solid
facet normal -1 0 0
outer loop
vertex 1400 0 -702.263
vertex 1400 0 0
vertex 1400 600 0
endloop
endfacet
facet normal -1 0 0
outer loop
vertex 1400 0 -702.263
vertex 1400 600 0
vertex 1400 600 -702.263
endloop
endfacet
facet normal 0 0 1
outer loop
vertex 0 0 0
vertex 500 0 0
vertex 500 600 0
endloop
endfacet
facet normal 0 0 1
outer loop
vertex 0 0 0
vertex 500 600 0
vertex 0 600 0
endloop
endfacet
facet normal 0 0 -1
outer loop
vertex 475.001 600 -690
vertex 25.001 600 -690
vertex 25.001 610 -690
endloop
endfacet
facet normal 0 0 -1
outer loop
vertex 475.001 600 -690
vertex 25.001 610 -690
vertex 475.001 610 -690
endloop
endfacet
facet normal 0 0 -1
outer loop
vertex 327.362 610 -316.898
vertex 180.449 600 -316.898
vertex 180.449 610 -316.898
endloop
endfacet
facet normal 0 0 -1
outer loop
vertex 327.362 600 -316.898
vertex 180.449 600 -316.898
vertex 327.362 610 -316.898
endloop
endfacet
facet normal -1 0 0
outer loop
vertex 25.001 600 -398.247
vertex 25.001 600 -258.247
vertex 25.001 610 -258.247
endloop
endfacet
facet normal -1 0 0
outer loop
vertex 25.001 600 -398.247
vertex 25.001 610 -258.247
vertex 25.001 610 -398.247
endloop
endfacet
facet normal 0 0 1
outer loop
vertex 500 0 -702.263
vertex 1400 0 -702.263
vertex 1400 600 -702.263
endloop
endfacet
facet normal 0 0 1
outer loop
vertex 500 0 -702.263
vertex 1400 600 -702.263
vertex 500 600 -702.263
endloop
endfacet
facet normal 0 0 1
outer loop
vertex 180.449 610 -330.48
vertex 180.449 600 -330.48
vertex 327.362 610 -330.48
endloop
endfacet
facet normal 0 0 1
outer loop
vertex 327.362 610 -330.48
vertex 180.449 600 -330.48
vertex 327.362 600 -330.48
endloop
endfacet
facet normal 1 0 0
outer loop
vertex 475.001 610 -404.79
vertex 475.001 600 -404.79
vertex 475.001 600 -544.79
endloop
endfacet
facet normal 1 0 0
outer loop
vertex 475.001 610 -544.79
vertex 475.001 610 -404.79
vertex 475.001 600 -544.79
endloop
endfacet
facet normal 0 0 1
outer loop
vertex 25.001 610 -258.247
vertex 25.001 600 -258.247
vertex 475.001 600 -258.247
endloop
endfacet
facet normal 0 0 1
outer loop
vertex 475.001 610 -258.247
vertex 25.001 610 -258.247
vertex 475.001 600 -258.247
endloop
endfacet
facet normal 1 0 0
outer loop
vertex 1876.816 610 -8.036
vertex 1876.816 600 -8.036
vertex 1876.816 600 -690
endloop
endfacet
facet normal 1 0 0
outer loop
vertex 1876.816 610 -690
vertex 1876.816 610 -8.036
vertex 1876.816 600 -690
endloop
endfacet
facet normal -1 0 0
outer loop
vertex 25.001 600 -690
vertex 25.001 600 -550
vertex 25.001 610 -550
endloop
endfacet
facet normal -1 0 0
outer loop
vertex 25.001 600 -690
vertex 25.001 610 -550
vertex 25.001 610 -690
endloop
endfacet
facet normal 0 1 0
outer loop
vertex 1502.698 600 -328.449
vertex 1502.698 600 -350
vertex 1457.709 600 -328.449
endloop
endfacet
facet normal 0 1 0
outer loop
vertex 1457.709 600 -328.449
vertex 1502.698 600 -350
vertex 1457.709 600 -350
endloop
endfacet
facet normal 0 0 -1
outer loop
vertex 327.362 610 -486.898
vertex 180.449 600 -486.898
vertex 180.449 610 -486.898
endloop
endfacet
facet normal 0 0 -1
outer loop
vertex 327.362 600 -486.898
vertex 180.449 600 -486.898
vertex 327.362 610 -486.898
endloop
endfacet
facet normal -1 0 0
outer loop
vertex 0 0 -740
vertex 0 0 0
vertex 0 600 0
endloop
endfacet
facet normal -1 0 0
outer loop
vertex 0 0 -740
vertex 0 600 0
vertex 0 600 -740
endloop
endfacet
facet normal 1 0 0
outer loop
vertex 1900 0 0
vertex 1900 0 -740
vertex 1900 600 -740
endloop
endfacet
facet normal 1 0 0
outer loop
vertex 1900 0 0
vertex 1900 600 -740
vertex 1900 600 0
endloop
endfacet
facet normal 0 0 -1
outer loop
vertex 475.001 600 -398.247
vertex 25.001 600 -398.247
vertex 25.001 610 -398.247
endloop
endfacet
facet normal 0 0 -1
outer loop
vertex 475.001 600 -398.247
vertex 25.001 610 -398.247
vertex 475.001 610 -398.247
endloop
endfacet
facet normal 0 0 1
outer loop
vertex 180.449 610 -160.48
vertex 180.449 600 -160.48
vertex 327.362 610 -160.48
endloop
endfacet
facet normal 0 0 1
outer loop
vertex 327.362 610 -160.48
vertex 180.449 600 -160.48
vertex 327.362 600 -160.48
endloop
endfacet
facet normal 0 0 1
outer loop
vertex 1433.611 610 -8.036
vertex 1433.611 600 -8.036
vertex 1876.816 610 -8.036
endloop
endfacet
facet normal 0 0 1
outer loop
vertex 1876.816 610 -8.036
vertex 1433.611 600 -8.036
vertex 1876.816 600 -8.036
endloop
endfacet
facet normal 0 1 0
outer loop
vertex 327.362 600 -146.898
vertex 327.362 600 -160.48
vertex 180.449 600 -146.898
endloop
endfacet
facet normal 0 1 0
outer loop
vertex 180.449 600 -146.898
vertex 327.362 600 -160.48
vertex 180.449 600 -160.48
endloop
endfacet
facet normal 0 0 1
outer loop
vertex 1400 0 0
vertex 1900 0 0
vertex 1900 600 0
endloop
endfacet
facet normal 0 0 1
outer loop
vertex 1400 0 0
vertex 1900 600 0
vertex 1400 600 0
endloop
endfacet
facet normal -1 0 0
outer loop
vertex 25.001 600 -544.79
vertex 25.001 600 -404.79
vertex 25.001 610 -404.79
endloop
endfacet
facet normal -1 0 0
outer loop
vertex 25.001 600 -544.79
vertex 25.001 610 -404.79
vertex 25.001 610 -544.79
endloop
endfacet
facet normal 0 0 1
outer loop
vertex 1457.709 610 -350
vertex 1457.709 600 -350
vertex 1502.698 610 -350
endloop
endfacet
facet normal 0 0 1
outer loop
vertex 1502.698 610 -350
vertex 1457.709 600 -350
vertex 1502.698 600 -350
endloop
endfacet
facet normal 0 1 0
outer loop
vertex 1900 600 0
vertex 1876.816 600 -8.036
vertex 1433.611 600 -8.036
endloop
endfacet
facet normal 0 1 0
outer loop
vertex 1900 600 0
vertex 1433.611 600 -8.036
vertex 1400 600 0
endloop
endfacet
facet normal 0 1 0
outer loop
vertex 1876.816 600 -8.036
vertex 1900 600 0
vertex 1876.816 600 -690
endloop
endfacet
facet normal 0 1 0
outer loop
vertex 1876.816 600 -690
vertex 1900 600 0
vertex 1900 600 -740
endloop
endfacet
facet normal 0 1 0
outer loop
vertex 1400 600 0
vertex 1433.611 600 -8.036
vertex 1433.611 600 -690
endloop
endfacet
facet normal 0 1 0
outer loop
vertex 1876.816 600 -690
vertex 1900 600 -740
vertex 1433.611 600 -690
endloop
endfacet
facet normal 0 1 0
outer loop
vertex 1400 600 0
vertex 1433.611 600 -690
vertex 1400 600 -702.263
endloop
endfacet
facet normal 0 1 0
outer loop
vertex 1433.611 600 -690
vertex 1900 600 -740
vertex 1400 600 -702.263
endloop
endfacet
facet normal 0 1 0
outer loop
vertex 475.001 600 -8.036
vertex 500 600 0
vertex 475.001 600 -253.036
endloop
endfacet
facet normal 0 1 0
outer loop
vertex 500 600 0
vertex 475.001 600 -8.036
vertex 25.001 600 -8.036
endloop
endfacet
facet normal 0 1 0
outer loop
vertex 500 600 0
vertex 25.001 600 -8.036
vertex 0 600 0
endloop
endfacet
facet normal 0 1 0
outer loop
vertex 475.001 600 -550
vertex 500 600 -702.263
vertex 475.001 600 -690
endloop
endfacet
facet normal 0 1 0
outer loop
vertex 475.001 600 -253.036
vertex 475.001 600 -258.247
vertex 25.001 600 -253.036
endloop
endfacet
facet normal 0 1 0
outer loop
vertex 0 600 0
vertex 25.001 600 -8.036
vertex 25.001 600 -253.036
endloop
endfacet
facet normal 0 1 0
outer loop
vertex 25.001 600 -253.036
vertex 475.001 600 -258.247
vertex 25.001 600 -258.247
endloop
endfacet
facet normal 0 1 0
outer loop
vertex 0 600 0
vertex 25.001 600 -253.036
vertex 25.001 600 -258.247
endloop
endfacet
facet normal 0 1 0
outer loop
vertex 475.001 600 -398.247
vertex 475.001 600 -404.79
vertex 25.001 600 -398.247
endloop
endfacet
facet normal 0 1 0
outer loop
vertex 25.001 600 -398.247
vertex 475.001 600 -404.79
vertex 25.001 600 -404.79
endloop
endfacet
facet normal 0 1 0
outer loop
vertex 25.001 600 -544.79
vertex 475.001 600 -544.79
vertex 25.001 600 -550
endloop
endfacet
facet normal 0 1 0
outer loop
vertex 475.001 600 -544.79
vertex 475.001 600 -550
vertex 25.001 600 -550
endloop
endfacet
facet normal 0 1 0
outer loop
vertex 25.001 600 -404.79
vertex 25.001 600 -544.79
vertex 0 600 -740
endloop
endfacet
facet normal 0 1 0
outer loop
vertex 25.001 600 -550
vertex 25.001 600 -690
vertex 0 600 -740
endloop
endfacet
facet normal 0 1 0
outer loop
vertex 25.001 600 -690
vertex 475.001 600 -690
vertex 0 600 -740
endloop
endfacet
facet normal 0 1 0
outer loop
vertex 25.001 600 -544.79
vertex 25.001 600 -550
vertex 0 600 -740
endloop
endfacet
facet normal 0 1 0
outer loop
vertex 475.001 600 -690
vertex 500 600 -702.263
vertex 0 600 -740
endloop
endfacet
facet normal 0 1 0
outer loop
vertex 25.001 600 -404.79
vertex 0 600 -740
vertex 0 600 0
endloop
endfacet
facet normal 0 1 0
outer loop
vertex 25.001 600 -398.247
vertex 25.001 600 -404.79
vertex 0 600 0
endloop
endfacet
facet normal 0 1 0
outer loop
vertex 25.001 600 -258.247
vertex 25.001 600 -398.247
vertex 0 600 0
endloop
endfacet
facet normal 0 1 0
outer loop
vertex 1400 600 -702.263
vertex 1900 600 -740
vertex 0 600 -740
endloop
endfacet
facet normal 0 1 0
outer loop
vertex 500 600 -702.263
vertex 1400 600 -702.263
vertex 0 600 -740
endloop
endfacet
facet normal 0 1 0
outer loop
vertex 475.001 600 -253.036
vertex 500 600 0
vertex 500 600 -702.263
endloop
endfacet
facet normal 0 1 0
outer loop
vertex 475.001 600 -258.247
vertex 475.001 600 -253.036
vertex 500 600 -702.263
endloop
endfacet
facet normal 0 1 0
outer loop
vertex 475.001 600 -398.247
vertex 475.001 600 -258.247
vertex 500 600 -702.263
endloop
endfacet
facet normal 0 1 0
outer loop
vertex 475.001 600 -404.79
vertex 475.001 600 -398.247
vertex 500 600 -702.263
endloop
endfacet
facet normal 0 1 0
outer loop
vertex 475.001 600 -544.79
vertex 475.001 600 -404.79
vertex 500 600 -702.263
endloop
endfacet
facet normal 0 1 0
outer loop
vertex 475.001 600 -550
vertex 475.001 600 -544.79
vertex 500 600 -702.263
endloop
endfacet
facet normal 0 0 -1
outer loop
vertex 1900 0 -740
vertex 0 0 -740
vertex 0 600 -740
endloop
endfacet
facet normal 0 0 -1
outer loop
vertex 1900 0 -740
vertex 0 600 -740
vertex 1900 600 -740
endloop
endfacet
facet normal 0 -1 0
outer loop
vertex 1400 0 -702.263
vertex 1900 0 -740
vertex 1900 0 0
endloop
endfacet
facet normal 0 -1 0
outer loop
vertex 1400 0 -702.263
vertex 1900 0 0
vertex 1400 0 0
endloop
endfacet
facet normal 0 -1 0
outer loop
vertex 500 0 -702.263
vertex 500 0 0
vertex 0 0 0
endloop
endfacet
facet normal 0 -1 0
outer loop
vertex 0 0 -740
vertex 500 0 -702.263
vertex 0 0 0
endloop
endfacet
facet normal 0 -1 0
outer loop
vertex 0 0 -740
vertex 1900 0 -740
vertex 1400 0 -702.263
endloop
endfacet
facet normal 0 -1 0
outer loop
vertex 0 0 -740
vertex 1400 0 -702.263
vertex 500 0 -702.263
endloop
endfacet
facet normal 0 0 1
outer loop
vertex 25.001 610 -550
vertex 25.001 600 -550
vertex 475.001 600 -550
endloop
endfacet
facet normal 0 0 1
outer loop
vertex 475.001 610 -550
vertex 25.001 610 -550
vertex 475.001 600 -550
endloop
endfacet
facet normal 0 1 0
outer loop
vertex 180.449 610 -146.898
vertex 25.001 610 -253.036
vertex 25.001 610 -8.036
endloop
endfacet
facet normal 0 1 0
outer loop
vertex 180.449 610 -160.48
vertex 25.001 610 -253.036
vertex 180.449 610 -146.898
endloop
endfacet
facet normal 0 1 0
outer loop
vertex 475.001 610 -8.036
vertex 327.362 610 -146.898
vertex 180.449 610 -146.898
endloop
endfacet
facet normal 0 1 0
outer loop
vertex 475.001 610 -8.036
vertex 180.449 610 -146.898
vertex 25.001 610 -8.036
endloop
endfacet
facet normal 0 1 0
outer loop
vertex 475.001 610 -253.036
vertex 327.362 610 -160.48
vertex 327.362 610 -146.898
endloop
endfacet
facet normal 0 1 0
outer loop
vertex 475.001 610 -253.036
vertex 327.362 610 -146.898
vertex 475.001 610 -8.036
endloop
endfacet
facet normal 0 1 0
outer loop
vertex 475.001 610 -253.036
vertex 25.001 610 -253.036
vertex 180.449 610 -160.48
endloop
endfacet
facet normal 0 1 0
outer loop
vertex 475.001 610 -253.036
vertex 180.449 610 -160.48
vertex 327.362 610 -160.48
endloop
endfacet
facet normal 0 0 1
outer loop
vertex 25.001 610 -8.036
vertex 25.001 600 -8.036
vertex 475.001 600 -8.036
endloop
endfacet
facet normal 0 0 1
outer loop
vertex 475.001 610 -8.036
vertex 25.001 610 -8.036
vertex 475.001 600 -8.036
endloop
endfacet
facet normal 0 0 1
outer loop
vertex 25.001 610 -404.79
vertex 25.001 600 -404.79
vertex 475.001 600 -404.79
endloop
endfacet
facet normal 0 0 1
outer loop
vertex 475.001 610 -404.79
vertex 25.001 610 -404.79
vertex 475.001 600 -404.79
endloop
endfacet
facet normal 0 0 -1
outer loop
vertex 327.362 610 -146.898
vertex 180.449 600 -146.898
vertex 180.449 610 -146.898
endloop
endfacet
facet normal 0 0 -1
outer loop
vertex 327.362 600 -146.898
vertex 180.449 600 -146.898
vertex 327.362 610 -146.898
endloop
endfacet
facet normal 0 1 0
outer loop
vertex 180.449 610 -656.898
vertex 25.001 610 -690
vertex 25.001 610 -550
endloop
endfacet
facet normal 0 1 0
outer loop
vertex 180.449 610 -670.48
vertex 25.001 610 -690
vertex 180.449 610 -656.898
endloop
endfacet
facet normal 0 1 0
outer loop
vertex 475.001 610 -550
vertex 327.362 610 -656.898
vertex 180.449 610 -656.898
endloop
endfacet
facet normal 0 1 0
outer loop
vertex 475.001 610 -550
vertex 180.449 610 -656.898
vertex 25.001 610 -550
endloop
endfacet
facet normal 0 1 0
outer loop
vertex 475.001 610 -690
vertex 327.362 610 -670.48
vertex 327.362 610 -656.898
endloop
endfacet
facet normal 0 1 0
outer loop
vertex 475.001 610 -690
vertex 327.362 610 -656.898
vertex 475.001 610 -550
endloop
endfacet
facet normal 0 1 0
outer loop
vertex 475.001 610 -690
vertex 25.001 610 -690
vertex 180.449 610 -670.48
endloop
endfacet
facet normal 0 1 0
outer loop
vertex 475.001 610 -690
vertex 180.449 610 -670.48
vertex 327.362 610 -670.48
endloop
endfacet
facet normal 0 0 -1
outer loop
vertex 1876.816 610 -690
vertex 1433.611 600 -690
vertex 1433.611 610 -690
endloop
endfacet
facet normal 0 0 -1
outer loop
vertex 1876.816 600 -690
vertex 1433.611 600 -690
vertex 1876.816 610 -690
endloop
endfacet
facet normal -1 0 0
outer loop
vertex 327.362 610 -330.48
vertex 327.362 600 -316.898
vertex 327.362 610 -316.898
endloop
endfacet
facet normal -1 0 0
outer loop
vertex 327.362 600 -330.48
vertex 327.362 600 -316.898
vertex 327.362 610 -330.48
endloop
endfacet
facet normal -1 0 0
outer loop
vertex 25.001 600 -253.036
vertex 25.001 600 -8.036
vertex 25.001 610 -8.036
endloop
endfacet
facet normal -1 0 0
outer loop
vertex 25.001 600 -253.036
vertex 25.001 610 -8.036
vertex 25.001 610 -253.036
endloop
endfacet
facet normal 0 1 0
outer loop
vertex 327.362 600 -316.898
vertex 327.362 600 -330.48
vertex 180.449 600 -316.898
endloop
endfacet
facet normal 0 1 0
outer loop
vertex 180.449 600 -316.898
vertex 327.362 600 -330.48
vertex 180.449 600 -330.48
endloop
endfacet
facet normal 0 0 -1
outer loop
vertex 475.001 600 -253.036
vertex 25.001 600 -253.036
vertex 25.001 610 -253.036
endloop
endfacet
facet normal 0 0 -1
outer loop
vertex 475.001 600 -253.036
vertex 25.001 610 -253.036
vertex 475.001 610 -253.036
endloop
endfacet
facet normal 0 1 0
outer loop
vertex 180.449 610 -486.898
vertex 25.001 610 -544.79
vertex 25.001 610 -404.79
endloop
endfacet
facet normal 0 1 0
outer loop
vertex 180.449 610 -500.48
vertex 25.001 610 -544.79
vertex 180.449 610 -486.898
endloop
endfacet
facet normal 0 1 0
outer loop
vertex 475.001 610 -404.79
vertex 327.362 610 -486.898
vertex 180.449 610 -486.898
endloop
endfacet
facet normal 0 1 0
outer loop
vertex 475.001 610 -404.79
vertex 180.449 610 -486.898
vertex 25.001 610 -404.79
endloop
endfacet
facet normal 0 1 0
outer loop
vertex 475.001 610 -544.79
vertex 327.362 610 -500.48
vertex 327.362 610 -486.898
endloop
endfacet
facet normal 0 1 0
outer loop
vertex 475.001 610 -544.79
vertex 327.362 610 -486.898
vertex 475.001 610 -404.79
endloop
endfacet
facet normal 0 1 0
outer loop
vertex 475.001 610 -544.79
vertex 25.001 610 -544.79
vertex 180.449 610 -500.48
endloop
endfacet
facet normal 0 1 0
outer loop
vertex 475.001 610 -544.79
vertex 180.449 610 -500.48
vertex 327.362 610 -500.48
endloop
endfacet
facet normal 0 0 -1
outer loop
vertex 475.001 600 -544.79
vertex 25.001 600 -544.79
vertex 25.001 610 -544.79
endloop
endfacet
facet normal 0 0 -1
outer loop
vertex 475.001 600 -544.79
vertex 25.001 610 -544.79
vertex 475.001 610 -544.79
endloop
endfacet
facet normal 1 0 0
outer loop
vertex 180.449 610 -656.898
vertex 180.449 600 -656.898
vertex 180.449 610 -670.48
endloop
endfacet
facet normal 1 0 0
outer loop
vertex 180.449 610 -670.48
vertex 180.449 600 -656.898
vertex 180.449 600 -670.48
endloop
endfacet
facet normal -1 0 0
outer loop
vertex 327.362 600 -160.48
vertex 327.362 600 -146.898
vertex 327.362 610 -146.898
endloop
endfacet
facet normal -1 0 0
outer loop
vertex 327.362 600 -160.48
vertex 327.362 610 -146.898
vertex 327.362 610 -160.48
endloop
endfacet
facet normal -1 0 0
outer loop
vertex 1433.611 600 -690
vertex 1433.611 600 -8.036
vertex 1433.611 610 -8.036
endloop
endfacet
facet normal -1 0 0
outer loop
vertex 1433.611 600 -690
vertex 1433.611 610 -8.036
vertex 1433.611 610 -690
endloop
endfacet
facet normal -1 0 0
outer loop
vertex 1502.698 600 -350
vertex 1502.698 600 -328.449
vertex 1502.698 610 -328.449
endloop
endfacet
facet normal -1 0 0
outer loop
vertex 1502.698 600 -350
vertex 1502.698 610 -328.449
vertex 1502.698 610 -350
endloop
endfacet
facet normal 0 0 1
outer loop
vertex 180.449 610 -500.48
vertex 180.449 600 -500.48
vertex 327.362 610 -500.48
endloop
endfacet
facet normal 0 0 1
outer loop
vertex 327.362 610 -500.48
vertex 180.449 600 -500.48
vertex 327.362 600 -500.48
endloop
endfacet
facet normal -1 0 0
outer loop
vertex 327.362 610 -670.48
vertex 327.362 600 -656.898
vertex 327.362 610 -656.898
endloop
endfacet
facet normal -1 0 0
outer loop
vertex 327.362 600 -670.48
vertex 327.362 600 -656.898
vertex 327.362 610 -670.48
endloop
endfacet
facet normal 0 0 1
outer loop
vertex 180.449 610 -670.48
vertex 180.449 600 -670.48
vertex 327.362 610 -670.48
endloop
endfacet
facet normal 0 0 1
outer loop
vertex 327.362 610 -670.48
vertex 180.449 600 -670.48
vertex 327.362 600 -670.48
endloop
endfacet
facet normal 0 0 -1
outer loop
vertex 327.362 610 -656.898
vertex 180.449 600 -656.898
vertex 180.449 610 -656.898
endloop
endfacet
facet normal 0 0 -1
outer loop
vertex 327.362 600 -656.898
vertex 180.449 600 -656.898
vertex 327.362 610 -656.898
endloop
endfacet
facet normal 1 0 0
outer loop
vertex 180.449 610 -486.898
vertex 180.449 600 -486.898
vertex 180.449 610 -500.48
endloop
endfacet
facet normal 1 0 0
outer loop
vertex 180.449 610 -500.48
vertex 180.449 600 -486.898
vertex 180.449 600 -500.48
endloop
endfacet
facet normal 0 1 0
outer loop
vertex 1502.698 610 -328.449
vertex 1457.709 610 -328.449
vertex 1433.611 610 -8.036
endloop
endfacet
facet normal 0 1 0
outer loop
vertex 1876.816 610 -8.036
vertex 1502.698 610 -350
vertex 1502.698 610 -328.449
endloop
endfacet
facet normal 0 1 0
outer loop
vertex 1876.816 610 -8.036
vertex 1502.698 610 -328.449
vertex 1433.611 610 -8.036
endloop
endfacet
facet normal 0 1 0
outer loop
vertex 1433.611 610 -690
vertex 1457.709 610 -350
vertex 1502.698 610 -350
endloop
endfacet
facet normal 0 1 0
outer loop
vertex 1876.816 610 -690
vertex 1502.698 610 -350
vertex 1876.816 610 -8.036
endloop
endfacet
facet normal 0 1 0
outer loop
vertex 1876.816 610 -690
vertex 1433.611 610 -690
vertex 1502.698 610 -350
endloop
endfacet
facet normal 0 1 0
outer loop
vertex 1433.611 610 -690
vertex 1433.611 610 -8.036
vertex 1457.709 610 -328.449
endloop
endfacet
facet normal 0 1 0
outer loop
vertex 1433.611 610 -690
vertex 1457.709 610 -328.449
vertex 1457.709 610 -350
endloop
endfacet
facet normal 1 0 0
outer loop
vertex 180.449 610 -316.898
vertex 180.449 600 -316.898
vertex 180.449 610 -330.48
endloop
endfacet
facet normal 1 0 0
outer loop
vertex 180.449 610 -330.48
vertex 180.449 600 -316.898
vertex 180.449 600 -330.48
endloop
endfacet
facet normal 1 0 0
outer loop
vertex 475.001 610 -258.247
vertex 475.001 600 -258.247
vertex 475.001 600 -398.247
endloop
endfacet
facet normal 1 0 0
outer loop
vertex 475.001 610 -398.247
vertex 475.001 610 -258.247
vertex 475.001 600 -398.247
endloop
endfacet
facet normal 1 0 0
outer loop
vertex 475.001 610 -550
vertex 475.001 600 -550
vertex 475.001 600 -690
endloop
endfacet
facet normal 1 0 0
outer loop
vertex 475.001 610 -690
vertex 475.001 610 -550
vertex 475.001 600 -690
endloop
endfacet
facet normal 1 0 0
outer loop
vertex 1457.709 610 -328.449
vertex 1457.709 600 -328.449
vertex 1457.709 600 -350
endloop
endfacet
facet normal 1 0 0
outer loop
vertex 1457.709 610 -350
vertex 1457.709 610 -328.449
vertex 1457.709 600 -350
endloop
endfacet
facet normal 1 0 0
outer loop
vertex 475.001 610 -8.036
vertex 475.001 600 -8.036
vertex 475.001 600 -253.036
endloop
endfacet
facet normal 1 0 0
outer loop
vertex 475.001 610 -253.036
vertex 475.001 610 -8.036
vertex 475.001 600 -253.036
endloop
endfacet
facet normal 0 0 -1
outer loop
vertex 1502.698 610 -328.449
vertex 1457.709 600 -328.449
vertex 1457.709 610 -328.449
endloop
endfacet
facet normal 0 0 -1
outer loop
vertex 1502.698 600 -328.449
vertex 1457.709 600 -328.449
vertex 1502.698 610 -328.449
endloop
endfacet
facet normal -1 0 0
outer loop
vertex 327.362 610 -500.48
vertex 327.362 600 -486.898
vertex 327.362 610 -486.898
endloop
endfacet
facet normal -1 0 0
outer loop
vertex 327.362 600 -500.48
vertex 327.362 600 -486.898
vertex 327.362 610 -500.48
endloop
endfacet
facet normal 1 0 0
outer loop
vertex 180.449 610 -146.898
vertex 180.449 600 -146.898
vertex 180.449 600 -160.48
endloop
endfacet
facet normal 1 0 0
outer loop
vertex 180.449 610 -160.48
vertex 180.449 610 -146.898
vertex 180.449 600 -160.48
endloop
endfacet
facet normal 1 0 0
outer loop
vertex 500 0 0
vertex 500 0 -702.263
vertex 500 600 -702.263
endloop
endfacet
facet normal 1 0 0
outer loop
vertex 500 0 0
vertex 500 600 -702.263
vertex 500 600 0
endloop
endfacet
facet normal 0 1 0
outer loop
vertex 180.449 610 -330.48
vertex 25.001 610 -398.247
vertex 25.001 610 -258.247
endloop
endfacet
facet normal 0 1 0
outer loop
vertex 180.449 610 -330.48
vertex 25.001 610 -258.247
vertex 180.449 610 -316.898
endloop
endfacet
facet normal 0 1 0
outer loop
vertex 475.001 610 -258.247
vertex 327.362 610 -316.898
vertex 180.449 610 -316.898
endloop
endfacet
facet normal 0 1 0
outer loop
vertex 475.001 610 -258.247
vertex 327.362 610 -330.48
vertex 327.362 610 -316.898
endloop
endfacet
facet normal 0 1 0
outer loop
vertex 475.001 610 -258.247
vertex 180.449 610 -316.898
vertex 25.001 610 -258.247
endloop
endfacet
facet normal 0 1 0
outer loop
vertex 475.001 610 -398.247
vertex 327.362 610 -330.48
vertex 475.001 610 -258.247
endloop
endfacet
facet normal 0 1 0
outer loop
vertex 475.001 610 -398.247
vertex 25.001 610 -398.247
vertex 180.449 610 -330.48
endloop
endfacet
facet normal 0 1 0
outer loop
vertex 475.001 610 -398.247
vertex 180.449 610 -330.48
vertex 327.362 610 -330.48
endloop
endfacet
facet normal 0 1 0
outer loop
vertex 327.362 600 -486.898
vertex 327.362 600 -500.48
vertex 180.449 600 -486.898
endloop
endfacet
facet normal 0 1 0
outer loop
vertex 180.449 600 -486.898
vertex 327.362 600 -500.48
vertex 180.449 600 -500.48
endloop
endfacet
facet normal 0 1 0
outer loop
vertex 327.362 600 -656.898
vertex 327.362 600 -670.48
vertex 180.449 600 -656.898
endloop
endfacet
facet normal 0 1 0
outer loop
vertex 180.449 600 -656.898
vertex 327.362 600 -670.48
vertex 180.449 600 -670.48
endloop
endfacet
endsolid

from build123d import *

# Parameters (mm, degrees)
BOSS_EXTRUDE1_DEPTH = 600
SKETCH2_W           = 450
SKETCH2_H           = 140
SKETCH2_W_2         = 146.91343935
SKETCH2_H_2         = 13.581682478
SKETCH2_H_3         = 245
SKETCH2_W_3         = 443.204970856
SKETCH2_H_4         = 681.963540889
SKETCH2_W_4         = 44.98901636
SKETCH2_H_5         = 21.550878859
BOSS_EXTRUDE2_DEPTH = 10


with BuildPart() as part:
    # Sketch1 → Boss-Extrude1 (new body)
    with BuildSketch(Plane(origin=(0, 0, 0), x_dir=(1, 0, 0), z_dir=(0, 1, 0))):
        Polygon((0, 0), (0, 740), (1900, 740), (1900, 0), (1400, 0), (1400, 702.263165655), (500, 702.263165655), (500, 0), align=None)
    extrude(amount=BOSS_EXTRUDE1_DEPTH)

    # Sketch2 → Boss-Extrude2 (add)
    with BuildSketch(Plane(origin=(0, 600, 0), x_dir=(1, 0, 0), z_dir=(0, 1, 0))):
        with Locations((250.001274905, 620)):
            Rectangle(SKETCH2_W, SKETCH2_H)
        with Locations((253.905576666, 663.689083521)):
            Rectangle(SKETCH2_W_2, SKETCH2_H_2, mode=Mode.SUBTRACT)
        with Locations((250.001274905, 474.789512045)):
            Rectangle(SKETCH2_W, SKETCH2_H)
        with Locations((253.905576666, 493.689083521)):
            Rectangle(SKETCH2_W_2, SKETCH2_H_2, mode=Mode.SUBTRACT)
        with Locations((250.001274905, 328.246947066)):
            Rectangle(SKETCH2_W, SKETCH2_H)
        with Locations((253.905576666, 323.689083521)):
            Rectangle(SKETCH2_W_2, SKETCH2_H_2, mode=Mode.SUBTRACT)
        with Locations((250.001274905, 130.536459111)):
            Rectangle(SKETCH2_W, SKETCH2_H_3)
        with Locations((253.905576666, 153.689083521)):
            Rectangle(SKETCH2_W_2, SKETCH2_H_2, mode=Mode.SUBTRACT)
        with Locations((1655.213820174, 349.018229555)):
            Rectangle(SKETCH2_W_3, SKETCH2_H_4)
        with Locations((1480.203434269, 339.22456057)):
            Rectangle(SKETCH2_W_4, SKETCH2_H_5, mode=Mode.SUBTRACT)
    extrude(amount=BOSS_EXTRUDE2_DEPTH)


solid = part.part
